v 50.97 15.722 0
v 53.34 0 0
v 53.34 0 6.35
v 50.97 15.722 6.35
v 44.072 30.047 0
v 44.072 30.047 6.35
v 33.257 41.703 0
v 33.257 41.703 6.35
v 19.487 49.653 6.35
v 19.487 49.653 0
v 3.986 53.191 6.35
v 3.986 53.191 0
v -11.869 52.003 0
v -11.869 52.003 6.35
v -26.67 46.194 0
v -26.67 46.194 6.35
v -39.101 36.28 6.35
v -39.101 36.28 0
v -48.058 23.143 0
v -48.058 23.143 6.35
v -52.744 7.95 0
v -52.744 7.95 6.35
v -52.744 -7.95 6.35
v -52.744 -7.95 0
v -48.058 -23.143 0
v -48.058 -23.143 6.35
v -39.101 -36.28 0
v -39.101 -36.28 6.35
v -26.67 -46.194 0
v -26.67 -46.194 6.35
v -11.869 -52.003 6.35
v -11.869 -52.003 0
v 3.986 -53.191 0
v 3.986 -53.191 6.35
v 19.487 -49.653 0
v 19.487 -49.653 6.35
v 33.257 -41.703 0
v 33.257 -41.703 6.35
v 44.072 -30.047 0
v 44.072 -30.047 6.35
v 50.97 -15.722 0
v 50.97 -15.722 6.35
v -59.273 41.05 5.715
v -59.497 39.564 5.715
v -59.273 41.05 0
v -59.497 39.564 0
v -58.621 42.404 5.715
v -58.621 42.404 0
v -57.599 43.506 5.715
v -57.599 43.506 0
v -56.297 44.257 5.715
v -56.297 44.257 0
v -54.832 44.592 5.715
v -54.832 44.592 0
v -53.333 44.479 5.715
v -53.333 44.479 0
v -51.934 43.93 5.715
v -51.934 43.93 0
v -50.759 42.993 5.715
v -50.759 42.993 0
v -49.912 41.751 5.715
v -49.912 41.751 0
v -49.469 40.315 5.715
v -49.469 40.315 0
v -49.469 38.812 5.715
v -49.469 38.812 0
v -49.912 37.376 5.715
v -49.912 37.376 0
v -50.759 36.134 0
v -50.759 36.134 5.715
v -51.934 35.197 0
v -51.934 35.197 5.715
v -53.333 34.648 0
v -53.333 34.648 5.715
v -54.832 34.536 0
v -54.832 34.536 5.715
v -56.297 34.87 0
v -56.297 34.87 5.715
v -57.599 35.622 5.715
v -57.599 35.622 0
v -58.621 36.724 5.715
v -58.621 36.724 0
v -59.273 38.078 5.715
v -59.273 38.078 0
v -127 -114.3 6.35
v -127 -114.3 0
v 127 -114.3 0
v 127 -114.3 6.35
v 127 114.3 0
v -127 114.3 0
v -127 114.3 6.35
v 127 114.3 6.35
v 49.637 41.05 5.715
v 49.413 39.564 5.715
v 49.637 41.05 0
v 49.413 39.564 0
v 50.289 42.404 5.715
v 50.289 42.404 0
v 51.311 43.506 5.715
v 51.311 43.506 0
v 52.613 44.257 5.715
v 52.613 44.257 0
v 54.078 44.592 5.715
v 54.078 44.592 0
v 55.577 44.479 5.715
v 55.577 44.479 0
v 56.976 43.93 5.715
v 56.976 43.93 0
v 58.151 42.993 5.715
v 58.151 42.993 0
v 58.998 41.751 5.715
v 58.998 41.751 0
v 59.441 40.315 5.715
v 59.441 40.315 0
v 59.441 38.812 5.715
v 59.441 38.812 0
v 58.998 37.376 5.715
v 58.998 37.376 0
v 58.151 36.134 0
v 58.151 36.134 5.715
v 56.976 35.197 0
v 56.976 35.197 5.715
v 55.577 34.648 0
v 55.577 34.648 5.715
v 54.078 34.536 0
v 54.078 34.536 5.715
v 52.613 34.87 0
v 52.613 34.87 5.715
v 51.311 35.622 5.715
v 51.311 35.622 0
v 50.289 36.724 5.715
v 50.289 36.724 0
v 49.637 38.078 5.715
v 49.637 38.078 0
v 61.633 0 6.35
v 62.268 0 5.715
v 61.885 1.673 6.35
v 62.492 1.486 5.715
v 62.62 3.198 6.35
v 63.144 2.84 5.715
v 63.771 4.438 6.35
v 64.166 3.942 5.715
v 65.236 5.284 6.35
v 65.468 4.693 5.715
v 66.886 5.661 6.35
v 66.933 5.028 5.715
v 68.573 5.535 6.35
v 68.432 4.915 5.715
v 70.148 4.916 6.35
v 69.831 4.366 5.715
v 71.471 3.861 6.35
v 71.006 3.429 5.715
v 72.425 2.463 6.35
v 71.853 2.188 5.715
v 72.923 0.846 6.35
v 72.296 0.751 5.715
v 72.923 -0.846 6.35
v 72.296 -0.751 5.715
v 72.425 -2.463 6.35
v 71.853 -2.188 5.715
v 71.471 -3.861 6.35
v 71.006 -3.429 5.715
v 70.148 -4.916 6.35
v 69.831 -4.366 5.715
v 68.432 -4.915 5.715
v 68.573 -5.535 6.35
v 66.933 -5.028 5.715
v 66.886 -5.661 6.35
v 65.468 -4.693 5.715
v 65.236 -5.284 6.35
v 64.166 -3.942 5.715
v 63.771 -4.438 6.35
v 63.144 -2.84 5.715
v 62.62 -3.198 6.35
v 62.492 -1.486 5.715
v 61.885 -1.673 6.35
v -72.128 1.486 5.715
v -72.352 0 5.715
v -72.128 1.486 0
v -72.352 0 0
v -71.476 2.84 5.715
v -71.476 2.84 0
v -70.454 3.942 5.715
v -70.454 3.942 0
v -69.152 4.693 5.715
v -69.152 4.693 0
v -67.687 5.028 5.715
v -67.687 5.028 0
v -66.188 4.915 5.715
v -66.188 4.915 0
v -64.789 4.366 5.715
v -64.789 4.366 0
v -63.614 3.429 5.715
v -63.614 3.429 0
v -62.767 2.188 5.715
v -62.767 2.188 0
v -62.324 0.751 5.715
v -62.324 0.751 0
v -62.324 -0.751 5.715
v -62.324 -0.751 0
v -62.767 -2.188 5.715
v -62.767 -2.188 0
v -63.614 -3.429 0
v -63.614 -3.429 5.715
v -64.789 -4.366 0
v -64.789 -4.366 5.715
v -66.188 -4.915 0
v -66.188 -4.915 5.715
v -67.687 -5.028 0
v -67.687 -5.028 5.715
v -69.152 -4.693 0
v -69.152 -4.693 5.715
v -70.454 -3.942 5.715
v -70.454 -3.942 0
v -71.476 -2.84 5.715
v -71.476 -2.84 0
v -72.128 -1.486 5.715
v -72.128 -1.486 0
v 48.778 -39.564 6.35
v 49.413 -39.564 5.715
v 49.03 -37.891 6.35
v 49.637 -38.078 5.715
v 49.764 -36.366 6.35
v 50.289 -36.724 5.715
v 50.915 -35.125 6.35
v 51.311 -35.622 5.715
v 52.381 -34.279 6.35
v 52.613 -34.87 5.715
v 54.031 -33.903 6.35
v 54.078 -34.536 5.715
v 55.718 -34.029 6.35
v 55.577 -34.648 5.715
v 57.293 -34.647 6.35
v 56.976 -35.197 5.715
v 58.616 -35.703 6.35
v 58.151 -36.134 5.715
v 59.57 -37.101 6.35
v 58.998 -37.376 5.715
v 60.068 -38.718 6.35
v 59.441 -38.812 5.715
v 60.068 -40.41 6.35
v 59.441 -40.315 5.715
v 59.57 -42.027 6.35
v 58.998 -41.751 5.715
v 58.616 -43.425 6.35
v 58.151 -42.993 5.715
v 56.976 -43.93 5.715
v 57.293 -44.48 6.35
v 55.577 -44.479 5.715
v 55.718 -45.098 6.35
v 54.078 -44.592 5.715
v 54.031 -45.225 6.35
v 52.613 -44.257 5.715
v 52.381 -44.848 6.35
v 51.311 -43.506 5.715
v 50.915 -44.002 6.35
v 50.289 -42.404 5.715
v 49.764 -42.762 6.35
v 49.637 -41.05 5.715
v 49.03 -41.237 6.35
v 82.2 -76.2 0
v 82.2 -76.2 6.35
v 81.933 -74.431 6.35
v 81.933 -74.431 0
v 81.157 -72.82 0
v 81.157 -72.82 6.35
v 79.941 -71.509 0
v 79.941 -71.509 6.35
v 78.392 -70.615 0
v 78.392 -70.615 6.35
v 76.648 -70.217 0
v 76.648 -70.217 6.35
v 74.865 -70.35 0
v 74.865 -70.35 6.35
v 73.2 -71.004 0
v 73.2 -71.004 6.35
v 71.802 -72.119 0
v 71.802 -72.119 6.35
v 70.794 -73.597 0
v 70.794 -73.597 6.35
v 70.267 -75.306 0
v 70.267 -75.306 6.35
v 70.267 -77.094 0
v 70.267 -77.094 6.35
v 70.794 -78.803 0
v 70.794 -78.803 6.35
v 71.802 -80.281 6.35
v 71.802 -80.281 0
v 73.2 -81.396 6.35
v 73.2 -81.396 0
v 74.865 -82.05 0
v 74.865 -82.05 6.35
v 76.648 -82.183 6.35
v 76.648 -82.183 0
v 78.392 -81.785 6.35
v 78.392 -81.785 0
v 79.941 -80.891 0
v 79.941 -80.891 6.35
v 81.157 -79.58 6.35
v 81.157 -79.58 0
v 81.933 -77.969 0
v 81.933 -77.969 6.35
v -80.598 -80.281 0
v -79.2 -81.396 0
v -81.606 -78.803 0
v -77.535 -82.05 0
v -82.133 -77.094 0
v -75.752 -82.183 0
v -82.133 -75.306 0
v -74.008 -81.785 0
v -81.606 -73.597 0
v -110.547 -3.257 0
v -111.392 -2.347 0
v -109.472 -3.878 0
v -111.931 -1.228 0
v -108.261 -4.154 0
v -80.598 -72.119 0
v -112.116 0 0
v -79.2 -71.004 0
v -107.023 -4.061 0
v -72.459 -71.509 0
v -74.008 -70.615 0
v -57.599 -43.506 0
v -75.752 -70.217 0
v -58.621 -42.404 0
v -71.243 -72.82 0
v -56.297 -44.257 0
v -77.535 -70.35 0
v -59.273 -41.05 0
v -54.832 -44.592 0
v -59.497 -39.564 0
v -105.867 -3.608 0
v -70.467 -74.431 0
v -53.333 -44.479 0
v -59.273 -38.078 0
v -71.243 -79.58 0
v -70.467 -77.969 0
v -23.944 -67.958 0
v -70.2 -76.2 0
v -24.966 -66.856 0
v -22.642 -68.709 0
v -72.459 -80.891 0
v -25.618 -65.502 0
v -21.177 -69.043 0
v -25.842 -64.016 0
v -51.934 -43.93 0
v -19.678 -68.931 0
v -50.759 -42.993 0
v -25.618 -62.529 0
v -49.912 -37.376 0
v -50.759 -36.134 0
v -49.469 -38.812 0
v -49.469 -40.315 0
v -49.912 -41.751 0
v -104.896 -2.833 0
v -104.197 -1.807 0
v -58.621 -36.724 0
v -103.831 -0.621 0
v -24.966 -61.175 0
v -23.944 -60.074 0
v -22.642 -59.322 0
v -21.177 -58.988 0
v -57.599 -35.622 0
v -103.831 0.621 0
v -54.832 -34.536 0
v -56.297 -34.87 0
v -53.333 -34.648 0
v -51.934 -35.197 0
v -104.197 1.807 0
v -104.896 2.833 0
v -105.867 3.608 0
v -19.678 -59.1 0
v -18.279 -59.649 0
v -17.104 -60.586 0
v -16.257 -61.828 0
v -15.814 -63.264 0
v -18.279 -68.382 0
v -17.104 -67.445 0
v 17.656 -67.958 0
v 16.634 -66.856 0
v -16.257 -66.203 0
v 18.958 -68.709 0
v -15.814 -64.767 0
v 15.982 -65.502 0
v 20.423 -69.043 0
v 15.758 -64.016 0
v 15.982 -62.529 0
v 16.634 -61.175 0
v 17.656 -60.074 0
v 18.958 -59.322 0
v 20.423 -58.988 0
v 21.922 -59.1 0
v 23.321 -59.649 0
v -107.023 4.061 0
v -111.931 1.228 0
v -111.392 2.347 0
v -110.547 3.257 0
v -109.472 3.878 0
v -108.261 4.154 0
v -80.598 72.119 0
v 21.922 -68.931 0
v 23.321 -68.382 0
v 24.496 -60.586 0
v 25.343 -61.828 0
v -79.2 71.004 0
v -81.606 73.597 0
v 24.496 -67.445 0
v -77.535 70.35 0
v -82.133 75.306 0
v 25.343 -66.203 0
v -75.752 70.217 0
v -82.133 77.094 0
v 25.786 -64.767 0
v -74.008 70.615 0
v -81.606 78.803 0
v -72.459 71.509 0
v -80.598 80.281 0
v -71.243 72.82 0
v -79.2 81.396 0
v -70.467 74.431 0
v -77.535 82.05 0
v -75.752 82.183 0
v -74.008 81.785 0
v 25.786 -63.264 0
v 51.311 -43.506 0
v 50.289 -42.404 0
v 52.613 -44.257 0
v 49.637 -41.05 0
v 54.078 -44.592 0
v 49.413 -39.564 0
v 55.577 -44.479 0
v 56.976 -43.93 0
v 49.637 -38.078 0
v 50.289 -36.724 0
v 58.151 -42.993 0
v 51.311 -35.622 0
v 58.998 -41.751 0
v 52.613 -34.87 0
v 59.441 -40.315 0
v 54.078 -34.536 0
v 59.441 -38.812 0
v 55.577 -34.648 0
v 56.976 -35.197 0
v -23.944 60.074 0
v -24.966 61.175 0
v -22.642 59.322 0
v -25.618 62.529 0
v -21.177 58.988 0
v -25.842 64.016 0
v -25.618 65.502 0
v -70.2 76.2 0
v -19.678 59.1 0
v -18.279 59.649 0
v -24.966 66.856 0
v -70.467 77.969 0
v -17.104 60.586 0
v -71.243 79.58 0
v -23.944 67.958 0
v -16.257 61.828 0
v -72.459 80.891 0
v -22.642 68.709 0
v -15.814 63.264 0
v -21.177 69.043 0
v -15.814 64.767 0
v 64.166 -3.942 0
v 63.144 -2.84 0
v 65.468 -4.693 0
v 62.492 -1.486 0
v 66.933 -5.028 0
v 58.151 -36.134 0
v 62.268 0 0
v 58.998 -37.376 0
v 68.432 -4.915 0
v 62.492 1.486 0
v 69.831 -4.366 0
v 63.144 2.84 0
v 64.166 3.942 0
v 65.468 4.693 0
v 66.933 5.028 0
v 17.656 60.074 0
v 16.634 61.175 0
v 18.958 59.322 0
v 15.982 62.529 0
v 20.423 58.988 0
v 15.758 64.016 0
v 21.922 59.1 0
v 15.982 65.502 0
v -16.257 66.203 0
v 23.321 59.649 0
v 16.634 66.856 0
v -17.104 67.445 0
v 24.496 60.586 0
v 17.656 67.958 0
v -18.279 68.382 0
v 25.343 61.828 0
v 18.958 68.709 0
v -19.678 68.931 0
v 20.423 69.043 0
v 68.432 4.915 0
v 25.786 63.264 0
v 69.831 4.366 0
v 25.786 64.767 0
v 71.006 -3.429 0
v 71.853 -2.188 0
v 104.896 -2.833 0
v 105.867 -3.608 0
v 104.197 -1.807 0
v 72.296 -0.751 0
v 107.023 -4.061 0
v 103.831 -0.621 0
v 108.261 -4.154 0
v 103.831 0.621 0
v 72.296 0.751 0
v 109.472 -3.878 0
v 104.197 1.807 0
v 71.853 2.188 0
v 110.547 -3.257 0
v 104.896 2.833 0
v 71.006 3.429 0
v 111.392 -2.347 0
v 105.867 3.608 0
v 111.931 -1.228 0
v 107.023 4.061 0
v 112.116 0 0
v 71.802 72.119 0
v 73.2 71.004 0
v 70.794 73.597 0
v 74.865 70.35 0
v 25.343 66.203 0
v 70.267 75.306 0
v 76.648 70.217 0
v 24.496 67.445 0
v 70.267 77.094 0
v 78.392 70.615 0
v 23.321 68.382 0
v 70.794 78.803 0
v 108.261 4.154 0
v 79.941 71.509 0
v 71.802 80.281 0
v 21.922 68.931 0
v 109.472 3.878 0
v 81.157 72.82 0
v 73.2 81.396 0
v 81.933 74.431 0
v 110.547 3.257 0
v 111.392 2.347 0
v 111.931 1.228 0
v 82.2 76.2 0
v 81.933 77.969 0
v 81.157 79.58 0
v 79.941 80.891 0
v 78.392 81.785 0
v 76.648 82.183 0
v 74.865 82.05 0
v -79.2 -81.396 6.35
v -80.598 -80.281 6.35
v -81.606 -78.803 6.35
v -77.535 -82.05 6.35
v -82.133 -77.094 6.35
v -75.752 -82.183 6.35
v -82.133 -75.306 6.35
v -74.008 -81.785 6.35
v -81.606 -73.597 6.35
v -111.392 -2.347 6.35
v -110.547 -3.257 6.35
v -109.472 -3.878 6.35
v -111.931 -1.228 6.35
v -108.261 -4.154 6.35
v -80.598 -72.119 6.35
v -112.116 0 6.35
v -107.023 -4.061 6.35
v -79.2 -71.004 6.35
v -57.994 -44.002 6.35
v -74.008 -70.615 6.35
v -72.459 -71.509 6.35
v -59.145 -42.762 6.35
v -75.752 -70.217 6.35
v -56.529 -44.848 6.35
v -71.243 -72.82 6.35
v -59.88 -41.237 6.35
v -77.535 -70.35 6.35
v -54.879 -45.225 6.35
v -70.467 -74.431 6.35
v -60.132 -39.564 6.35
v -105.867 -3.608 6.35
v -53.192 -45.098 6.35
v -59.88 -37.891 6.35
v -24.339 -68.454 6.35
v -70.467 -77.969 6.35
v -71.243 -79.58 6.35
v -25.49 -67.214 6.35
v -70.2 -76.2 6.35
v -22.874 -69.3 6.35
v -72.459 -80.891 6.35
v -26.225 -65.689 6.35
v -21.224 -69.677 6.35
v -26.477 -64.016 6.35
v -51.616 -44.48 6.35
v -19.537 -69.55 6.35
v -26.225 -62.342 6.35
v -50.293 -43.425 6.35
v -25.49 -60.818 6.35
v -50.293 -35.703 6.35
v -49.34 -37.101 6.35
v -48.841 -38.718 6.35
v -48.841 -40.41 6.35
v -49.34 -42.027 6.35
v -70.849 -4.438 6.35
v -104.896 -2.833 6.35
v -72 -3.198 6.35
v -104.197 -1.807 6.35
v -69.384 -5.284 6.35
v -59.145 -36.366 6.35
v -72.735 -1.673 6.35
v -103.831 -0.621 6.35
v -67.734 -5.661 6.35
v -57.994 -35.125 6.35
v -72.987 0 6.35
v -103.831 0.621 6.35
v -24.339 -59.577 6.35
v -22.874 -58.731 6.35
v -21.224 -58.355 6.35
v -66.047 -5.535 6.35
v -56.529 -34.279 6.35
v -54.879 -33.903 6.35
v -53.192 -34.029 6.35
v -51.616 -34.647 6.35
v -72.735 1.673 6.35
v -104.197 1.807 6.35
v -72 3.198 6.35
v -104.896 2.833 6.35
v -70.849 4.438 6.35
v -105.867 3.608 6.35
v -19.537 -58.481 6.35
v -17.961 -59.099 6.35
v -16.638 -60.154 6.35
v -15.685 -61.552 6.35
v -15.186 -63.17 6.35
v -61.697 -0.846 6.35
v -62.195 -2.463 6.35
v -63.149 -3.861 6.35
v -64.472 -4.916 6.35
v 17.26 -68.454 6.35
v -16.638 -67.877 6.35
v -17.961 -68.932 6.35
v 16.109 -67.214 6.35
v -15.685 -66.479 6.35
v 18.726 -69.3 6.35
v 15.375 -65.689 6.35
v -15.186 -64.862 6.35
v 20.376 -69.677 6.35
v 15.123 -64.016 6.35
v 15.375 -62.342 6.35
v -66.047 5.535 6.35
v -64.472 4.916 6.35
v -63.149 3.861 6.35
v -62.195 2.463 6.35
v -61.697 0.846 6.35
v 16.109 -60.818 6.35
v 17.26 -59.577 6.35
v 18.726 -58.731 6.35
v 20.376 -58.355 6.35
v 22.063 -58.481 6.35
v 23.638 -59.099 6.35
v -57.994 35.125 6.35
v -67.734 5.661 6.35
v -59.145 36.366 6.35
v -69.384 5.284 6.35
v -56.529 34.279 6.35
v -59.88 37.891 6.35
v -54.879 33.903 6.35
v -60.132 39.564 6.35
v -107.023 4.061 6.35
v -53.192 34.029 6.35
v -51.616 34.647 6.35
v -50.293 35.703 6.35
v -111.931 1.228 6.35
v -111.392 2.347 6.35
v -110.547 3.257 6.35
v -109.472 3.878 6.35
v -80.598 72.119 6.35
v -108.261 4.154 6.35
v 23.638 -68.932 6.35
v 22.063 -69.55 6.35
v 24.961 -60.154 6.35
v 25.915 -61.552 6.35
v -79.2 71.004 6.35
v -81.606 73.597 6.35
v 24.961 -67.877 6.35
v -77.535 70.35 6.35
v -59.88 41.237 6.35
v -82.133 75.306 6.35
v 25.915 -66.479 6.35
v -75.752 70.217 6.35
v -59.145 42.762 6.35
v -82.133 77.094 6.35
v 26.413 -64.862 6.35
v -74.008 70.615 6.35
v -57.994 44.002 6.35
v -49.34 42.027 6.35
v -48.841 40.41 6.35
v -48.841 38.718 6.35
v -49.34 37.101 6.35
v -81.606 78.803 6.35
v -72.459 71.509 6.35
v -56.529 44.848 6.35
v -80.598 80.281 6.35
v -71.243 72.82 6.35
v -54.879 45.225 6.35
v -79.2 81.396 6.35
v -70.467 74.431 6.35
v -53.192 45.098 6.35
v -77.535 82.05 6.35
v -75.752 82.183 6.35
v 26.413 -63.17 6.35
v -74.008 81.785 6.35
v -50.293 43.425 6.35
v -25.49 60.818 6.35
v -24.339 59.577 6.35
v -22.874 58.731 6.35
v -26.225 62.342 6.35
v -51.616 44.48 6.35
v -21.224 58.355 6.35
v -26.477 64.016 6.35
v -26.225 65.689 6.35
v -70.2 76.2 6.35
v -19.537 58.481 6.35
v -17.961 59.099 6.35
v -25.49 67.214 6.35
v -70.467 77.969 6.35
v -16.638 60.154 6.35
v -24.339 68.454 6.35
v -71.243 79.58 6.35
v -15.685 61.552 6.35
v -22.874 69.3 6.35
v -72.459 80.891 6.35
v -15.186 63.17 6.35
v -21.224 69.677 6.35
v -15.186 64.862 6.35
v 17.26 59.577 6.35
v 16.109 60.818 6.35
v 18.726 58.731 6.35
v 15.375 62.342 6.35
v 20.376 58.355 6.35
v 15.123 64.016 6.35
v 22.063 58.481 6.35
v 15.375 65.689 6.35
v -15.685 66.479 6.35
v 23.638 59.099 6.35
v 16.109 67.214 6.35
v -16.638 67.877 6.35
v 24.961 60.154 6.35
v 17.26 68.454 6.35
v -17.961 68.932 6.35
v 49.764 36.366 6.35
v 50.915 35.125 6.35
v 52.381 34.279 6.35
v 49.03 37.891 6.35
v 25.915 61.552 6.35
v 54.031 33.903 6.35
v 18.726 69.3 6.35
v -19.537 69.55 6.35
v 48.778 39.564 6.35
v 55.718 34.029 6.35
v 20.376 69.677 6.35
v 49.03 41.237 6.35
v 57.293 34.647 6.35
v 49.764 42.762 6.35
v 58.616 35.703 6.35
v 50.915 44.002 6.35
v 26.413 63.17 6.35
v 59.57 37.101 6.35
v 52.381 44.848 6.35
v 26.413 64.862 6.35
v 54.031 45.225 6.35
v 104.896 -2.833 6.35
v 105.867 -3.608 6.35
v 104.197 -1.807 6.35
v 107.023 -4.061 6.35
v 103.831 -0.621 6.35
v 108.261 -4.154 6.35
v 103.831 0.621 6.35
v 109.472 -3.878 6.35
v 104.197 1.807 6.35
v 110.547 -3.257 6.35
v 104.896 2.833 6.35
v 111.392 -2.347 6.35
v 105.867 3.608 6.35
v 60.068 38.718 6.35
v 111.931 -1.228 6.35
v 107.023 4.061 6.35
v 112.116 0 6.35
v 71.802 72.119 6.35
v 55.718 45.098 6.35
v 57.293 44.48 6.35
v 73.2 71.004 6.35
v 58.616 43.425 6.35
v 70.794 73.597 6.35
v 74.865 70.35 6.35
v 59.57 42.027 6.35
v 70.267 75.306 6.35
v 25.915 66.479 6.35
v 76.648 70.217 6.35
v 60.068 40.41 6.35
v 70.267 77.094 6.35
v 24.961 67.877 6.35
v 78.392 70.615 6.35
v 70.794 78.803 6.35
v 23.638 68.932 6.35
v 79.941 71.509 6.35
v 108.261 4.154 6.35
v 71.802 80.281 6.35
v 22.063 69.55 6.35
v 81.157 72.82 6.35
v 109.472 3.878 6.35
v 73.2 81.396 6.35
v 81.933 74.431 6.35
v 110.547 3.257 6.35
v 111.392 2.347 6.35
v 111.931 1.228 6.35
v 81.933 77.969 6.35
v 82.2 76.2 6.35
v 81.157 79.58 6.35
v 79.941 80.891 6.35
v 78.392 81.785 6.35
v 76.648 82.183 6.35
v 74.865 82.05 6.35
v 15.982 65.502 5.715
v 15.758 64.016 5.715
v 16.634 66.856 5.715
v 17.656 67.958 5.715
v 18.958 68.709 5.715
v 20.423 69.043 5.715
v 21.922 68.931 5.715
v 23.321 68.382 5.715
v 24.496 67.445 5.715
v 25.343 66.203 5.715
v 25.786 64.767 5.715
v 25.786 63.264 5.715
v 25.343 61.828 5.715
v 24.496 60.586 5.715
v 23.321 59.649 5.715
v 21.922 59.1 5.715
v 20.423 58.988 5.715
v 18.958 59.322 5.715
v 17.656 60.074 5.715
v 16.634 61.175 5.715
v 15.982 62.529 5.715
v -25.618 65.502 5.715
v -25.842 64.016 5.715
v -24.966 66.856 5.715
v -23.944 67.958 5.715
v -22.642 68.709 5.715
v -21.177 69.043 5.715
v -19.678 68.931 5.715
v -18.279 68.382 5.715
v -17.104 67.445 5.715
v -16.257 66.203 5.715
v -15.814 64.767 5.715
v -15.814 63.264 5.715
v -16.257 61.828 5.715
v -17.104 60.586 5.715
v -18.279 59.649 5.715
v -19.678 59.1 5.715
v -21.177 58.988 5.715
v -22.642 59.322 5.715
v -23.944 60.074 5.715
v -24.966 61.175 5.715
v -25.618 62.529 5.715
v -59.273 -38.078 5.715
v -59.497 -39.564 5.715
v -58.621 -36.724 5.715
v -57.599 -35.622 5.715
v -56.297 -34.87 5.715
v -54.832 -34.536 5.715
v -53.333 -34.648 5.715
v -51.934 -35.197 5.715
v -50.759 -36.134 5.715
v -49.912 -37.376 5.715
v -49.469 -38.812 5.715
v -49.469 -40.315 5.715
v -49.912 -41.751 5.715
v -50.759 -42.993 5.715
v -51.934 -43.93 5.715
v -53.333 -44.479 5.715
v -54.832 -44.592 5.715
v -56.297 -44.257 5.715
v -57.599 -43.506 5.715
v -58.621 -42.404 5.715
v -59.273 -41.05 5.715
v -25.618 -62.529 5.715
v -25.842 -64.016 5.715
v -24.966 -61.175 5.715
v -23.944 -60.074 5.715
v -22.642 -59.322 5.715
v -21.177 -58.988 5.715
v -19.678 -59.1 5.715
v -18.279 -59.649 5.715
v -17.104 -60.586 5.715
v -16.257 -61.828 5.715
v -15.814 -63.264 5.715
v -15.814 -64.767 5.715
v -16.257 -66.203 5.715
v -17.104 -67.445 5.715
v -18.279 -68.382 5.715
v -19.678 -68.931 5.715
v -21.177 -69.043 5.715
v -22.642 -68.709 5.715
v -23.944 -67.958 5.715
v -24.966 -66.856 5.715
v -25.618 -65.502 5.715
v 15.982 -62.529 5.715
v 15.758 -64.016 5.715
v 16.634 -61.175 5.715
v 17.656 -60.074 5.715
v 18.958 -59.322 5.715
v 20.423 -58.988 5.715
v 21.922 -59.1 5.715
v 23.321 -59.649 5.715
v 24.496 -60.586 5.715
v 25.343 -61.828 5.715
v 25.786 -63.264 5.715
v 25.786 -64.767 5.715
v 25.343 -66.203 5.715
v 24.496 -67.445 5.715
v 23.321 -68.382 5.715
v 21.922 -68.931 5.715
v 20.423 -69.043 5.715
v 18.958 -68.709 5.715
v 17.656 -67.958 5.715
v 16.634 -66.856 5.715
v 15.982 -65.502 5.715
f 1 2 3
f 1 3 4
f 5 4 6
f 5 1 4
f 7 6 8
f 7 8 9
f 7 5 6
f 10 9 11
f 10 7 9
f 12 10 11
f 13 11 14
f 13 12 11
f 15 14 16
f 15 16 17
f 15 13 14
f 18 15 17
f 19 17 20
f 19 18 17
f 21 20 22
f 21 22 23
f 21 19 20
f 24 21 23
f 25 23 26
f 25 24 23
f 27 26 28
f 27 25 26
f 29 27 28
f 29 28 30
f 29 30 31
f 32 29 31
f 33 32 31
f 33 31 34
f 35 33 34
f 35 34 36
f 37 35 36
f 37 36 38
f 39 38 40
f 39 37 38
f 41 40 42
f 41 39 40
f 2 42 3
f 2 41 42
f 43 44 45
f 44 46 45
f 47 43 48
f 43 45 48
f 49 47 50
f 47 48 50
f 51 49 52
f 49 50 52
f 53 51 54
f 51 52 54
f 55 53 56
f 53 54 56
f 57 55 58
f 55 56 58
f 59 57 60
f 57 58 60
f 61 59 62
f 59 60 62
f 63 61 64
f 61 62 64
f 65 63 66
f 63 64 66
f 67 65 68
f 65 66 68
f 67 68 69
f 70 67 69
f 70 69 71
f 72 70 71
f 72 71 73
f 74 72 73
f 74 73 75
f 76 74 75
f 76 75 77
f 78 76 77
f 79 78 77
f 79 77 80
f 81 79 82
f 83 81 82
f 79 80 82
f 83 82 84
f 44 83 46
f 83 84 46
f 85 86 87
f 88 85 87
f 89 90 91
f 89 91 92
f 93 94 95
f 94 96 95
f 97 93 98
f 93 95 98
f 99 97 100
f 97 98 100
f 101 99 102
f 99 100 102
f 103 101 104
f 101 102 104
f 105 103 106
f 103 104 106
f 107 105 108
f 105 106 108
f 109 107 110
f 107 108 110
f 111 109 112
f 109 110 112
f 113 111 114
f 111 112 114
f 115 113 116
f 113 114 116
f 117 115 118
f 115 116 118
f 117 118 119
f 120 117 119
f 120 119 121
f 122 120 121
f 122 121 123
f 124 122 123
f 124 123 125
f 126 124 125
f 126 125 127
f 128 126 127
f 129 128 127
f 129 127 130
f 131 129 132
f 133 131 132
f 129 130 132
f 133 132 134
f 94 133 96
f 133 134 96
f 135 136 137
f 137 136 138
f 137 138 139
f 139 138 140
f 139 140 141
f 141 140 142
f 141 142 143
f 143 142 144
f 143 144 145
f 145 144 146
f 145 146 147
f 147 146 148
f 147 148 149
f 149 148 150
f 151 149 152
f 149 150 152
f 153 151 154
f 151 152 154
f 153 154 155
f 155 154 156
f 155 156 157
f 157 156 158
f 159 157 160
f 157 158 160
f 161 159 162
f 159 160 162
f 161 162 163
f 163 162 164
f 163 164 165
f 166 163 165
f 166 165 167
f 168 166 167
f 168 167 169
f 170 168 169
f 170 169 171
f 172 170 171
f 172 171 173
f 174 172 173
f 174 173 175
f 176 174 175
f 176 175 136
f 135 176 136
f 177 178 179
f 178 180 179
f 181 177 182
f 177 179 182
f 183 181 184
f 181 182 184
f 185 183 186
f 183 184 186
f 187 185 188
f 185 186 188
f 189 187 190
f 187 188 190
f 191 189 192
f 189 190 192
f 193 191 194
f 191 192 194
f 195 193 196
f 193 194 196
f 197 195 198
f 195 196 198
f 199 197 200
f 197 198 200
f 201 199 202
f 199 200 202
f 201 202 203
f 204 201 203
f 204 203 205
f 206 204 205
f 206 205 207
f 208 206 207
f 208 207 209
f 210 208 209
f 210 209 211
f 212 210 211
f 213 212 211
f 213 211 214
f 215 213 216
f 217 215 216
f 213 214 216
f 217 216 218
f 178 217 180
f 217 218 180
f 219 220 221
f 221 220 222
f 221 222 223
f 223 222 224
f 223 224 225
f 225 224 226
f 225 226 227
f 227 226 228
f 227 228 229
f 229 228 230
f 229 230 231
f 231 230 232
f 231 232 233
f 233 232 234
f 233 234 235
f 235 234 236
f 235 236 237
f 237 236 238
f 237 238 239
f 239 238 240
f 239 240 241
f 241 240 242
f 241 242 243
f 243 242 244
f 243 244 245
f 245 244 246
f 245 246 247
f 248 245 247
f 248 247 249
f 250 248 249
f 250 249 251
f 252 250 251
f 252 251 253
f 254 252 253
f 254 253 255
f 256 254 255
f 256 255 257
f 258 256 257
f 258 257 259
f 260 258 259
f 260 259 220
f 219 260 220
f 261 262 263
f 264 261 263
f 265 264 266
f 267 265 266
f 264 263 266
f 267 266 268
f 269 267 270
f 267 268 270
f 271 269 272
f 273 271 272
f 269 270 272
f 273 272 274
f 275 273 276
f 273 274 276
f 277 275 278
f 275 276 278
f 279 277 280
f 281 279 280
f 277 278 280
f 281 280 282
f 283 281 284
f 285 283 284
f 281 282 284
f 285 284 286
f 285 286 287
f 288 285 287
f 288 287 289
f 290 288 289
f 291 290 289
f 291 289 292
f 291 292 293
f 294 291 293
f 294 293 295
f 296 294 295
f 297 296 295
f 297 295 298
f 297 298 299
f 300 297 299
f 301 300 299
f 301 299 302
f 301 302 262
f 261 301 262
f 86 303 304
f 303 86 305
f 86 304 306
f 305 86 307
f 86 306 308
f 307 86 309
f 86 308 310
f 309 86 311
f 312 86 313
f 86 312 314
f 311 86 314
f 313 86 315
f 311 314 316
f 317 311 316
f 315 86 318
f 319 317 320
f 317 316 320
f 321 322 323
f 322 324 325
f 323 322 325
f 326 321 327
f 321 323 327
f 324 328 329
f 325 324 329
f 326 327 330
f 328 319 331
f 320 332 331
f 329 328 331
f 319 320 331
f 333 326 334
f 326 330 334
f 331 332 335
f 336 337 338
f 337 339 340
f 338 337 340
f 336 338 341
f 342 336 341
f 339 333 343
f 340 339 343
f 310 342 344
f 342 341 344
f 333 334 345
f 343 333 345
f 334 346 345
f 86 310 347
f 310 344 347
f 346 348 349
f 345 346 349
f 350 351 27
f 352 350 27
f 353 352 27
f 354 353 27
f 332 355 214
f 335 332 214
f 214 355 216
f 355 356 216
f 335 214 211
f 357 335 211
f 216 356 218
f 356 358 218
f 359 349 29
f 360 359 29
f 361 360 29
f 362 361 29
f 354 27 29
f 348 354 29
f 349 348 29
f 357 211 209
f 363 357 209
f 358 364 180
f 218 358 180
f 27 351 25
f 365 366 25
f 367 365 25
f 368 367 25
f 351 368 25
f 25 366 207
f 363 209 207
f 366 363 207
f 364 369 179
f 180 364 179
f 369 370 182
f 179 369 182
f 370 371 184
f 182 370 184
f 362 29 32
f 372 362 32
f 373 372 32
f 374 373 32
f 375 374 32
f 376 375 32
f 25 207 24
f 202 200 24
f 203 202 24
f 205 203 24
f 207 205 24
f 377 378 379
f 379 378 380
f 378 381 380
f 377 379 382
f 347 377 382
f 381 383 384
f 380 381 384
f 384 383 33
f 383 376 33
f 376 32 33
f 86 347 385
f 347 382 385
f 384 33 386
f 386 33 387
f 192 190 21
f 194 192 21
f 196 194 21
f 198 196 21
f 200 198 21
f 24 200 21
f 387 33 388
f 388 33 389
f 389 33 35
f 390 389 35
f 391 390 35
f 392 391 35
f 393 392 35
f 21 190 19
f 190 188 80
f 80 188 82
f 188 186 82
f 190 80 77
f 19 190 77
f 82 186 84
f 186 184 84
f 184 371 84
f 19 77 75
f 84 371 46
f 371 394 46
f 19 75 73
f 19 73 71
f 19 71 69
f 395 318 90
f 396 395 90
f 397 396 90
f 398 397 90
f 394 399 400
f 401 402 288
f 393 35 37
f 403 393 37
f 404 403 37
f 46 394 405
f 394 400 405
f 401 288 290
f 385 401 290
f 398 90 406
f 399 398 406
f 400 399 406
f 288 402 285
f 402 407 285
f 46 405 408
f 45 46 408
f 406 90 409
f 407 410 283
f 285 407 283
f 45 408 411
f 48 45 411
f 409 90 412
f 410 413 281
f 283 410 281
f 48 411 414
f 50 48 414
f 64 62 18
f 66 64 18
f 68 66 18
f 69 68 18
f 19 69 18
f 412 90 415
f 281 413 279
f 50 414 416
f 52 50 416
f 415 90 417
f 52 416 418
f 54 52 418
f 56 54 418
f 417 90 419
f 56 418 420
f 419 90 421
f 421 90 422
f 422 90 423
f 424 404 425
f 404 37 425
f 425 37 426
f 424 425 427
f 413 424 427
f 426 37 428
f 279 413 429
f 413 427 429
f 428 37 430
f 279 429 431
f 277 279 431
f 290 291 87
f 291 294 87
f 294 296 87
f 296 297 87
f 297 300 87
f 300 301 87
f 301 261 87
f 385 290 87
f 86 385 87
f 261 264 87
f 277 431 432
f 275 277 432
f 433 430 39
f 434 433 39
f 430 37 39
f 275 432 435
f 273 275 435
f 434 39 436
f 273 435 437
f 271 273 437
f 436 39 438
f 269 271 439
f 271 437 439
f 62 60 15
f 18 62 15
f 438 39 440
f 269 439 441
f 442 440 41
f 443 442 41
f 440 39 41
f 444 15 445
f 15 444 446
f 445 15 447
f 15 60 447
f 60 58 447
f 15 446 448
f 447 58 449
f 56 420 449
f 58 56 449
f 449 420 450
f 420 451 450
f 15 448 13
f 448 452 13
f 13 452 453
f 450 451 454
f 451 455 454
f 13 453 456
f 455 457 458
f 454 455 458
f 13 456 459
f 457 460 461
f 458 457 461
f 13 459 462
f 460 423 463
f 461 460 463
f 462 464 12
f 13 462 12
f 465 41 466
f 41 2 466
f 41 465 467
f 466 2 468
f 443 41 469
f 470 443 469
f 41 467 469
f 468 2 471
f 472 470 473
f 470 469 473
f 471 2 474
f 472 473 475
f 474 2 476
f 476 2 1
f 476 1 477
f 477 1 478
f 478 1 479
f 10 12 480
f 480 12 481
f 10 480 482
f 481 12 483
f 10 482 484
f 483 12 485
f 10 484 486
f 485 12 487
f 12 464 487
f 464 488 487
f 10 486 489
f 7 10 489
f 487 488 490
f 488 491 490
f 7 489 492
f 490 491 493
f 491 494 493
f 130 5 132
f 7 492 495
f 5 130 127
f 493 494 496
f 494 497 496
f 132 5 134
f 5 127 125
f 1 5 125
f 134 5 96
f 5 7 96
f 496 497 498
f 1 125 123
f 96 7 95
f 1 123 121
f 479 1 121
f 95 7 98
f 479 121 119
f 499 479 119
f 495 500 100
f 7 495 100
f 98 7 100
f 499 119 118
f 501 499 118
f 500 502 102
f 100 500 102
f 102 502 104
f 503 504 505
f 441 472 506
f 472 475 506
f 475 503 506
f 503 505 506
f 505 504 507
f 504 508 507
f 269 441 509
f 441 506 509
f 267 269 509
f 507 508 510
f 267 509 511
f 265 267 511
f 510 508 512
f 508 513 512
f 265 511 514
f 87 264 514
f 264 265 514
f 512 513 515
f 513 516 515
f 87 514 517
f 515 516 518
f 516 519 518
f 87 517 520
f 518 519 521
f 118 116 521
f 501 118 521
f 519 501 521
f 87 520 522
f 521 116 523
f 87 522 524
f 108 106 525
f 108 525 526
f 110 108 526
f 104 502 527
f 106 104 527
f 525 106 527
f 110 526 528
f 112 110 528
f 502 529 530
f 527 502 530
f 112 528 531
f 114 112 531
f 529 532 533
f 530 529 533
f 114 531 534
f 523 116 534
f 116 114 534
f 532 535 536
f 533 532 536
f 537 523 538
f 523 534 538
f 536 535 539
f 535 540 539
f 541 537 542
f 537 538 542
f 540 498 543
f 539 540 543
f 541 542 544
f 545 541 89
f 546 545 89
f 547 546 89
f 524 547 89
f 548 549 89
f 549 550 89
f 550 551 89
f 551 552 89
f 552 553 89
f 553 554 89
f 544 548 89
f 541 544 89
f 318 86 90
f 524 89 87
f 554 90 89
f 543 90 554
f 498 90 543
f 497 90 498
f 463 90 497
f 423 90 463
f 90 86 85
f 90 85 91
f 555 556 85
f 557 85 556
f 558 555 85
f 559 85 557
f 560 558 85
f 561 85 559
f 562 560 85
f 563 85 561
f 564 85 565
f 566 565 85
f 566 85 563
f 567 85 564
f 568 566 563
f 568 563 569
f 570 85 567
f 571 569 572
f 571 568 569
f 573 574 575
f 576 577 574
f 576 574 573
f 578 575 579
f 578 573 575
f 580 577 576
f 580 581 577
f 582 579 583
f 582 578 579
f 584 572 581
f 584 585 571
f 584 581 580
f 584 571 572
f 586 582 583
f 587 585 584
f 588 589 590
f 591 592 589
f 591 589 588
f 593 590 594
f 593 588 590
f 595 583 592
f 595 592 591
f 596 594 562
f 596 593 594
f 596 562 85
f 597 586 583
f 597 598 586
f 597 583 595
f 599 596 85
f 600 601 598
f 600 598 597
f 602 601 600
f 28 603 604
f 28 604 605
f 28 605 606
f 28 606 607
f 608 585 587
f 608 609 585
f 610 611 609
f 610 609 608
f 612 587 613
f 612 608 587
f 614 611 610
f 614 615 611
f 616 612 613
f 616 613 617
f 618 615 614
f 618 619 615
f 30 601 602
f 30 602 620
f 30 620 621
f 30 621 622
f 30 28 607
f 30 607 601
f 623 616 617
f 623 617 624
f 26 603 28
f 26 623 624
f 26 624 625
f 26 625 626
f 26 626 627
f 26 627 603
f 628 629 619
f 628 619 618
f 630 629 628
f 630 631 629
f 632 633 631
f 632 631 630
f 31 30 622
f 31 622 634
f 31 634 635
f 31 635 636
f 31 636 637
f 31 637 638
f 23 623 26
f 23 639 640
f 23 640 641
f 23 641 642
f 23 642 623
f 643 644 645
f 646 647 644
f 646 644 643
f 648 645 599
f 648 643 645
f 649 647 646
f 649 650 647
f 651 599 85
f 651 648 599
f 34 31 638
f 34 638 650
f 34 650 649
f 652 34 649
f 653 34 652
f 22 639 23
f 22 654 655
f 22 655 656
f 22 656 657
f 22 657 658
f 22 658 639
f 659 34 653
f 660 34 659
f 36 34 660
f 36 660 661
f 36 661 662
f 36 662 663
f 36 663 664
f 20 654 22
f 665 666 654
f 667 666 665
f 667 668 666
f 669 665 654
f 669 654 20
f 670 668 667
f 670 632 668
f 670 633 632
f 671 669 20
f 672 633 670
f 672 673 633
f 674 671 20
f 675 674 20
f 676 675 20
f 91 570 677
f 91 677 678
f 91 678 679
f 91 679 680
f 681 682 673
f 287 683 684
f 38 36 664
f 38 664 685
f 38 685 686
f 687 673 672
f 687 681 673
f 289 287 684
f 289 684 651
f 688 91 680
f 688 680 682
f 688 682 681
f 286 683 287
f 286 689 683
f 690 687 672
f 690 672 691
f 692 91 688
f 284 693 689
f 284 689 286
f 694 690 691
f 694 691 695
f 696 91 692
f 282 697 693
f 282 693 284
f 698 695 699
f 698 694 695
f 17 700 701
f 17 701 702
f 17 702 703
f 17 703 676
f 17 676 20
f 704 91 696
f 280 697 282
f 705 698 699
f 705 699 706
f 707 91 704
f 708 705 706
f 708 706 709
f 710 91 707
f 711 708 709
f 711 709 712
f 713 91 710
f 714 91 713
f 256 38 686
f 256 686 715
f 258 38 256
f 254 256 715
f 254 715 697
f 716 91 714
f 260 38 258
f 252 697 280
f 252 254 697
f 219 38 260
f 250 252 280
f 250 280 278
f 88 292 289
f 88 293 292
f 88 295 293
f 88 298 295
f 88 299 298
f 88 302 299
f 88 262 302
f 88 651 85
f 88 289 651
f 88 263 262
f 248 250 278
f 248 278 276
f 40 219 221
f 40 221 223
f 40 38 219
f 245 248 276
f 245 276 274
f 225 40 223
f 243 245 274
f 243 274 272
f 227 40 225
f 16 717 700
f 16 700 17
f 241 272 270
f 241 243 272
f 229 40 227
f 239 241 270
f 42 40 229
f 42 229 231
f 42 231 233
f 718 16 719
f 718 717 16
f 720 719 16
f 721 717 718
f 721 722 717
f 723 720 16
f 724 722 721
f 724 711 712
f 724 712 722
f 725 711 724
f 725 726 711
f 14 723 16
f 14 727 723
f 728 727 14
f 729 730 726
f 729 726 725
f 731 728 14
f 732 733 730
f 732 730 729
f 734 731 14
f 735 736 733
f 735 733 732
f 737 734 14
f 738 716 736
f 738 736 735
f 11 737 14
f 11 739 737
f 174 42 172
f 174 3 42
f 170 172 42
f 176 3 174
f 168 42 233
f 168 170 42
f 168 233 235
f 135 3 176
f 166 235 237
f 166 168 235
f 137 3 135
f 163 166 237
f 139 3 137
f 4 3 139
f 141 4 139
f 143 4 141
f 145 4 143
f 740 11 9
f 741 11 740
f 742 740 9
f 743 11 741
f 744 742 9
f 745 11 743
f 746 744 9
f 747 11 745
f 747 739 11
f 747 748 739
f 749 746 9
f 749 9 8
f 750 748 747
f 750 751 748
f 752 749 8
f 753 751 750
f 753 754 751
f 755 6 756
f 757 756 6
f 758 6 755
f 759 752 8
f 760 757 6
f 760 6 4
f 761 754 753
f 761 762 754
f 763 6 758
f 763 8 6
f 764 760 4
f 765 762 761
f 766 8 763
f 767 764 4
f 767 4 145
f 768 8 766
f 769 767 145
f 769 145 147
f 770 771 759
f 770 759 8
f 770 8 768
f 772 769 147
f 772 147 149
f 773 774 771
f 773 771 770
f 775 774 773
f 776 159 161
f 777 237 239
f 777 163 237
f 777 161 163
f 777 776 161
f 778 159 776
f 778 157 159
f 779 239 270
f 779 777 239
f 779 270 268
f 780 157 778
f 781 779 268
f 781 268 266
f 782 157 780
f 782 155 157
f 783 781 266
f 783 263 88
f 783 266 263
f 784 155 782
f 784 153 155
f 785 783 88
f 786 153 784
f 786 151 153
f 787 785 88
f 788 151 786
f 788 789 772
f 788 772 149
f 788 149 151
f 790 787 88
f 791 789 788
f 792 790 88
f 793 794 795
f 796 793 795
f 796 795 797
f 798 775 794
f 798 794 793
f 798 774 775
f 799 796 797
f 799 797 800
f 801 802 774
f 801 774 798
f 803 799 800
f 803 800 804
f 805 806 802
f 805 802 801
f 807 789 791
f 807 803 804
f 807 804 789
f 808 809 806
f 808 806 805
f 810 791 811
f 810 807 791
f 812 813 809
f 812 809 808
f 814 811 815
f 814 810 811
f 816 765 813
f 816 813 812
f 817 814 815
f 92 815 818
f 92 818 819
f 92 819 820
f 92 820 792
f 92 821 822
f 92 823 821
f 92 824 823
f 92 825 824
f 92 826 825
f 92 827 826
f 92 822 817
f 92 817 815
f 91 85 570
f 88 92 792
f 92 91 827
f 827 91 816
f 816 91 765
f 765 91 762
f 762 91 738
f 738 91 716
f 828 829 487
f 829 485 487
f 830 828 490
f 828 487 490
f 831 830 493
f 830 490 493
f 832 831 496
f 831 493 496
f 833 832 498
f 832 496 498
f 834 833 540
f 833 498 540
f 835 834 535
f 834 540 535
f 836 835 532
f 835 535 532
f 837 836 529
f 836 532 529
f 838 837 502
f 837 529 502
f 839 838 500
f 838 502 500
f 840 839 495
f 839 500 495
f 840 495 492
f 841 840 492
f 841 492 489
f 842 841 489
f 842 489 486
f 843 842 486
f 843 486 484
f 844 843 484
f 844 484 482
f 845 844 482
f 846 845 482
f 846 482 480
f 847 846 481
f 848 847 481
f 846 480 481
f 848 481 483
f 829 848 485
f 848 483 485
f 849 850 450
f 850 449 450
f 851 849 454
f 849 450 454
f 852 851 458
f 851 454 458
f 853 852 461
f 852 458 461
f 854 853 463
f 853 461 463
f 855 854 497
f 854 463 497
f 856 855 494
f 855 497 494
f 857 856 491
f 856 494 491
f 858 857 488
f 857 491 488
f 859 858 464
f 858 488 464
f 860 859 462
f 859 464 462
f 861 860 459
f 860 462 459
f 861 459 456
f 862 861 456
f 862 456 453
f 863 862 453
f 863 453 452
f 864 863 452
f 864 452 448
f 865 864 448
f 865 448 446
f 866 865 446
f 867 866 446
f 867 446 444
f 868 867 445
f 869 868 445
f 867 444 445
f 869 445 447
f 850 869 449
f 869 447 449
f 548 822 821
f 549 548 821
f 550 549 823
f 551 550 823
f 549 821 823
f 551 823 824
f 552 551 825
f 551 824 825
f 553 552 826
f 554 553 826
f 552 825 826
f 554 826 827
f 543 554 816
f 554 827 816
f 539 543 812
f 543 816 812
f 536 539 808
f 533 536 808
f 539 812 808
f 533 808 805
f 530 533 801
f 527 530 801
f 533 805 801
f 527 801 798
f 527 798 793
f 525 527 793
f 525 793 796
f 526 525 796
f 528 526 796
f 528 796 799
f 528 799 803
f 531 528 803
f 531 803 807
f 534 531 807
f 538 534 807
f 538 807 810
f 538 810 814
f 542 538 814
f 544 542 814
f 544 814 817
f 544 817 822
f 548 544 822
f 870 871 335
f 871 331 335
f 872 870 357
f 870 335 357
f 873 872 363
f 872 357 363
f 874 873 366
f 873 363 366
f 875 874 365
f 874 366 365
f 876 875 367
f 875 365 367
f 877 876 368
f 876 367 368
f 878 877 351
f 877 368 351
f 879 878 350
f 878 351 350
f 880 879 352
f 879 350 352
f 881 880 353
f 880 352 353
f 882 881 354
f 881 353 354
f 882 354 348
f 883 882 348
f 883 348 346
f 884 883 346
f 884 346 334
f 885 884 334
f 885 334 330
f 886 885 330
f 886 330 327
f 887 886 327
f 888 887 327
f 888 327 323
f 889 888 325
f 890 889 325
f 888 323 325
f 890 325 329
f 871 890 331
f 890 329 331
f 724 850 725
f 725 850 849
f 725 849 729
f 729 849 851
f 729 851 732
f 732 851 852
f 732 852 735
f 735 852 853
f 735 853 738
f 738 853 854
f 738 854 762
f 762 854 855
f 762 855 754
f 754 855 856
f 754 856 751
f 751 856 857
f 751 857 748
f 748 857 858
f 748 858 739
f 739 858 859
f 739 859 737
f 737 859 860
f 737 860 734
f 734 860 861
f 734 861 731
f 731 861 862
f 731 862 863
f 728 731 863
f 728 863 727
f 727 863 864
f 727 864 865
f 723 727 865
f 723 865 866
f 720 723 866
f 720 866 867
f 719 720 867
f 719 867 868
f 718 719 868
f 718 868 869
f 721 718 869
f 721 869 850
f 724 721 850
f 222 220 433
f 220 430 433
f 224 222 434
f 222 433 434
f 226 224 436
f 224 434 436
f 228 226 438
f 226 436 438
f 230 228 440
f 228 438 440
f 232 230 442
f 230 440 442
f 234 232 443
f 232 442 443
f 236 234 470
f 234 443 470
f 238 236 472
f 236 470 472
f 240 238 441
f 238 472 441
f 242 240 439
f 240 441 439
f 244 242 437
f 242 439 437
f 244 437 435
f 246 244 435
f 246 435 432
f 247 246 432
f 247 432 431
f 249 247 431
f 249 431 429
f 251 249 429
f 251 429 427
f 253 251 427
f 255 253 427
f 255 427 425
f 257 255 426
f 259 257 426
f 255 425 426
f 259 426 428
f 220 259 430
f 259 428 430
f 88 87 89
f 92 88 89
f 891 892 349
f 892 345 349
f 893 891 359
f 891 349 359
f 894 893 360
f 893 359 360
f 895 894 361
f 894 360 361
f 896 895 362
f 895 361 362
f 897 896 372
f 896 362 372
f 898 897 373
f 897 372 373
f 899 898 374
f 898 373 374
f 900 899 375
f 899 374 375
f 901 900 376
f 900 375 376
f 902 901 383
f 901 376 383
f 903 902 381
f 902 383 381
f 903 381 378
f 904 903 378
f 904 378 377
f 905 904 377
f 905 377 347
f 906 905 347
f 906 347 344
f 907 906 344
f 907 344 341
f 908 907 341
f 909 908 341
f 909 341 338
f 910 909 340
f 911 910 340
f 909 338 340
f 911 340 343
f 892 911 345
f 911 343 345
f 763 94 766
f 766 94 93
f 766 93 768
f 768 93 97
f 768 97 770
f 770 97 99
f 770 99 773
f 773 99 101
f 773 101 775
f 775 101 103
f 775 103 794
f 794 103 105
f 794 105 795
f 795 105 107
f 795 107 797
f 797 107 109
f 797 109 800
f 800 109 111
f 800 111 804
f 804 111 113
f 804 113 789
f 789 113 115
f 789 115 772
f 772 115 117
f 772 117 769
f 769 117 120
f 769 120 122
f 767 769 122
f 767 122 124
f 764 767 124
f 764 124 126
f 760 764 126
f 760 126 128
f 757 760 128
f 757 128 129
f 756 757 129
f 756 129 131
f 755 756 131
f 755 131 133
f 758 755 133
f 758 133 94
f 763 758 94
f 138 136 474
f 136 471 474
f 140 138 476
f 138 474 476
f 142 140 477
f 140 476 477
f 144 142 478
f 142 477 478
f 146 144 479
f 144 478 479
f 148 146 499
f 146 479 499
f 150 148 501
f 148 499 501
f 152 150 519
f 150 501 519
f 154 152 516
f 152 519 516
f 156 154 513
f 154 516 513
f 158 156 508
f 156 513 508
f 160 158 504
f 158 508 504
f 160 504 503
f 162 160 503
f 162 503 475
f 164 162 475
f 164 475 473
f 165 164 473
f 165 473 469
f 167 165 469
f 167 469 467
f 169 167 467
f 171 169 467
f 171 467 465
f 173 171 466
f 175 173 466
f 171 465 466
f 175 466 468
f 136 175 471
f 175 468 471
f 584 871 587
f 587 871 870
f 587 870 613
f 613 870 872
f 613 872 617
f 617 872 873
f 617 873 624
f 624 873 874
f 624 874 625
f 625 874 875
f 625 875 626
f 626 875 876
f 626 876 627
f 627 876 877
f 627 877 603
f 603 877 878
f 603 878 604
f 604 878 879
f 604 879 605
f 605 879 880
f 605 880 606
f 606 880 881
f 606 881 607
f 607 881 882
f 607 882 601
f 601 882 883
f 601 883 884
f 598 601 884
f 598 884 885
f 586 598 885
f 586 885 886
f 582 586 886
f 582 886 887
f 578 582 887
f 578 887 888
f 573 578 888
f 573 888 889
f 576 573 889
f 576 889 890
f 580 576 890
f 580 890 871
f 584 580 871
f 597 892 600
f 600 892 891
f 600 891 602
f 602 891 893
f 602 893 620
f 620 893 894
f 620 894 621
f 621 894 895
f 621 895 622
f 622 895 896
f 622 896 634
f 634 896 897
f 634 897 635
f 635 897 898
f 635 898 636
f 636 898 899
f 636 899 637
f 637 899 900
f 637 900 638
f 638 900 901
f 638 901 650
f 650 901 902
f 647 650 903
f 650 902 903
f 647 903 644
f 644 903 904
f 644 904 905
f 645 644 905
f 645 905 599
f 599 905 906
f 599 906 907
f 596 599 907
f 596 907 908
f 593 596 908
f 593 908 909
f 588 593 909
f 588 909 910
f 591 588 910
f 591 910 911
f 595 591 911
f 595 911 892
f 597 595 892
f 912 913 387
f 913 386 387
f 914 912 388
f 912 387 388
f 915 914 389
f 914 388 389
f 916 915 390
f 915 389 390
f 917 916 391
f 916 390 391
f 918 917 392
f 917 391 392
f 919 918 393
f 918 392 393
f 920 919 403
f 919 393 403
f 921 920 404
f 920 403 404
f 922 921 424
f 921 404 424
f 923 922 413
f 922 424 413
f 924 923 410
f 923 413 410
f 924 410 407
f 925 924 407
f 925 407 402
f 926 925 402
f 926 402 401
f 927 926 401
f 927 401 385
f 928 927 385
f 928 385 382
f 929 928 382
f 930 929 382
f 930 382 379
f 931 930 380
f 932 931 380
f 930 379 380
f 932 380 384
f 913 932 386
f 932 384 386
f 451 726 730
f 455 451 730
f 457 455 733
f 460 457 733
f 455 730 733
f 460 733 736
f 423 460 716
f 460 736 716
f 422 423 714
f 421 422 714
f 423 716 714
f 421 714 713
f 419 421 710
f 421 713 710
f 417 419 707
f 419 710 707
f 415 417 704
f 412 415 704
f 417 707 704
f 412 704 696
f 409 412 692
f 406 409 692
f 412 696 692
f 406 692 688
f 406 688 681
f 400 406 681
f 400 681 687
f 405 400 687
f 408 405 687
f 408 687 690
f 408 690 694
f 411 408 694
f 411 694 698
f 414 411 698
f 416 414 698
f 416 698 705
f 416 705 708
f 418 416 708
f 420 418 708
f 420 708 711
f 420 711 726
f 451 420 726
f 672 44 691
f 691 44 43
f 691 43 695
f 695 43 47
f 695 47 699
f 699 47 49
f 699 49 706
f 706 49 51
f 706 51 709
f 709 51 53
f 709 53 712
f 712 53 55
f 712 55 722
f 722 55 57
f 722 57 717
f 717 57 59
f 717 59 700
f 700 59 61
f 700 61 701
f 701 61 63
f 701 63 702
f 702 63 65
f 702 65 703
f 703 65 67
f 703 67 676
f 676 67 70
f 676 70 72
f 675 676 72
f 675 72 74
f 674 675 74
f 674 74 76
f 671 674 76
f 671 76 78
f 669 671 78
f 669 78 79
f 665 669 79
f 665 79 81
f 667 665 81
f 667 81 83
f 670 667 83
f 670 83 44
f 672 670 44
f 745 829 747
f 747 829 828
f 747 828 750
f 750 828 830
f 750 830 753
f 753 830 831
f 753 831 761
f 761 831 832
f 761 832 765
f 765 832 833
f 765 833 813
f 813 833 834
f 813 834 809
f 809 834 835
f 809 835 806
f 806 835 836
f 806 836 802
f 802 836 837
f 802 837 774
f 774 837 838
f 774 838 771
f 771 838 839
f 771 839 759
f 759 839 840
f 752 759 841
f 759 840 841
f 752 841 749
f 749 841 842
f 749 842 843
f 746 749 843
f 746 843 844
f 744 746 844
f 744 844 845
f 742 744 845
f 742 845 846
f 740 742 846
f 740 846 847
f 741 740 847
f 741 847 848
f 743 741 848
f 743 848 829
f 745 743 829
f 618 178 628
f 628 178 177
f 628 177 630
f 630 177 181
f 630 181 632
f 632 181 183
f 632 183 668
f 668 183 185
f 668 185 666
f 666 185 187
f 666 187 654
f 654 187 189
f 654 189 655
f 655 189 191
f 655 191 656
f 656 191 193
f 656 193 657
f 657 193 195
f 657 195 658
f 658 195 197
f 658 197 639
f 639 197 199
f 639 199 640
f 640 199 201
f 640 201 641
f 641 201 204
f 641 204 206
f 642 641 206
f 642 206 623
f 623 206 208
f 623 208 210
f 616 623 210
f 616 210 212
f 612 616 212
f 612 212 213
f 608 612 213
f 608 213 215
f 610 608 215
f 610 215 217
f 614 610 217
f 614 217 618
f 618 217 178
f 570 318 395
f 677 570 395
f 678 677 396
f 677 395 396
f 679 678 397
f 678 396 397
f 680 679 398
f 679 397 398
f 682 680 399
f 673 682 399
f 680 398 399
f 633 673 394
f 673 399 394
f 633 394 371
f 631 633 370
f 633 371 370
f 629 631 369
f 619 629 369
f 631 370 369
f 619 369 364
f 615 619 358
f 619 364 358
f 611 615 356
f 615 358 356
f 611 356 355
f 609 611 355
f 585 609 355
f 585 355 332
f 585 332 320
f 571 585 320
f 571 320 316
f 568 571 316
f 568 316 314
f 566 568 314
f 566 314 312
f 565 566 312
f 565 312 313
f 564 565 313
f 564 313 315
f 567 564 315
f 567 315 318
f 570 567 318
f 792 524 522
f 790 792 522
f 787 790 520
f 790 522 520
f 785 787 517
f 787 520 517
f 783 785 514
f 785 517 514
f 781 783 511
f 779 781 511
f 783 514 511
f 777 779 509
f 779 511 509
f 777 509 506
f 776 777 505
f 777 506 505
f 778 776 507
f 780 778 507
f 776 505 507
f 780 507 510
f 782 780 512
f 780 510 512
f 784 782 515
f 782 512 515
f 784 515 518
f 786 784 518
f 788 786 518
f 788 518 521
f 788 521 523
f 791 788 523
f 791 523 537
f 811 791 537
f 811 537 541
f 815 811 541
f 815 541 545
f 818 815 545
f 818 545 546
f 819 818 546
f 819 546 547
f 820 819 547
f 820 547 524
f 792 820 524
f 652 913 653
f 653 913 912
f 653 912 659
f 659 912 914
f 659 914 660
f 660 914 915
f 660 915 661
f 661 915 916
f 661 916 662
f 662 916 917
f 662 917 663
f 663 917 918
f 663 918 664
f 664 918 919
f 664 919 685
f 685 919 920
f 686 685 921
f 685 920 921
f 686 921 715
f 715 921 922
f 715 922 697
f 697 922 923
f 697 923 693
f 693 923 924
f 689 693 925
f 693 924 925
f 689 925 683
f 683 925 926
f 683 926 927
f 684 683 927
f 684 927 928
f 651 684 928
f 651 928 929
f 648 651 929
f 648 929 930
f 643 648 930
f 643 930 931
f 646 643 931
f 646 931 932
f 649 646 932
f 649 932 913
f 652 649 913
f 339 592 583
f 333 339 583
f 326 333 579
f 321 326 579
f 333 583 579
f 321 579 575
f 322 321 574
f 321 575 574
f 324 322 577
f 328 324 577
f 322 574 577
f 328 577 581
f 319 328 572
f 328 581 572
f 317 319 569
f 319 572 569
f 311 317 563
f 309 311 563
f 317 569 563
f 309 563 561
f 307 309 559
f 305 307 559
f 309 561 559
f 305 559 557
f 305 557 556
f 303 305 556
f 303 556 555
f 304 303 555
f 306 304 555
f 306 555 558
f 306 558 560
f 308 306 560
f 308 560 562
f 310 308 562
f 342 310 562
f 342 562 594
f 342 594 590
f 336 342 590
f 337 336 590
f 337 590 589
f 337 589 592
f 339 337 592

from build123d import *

# Parameters (mm, degrees)
SKETCH1_W                         = 254
SKETCH1_H                         = 228.6
SKETCH1_R                         = 53.34
BOSS_EXTRUDE1_DEPTH               = 6.35
F_3_8_CLEARANCE_HOLE1_D           = 10.0838
F_3_8_CLEARANCE_HOLE1_CSINK_D     = 11.3538
F_3_8_CLEARANCE_HOLE1_CSINK_ANGLE = 90
F_12_0_12_DIAMETER_HOLE1_D        = 12
SKETCH11_R                        = 4.1656
CUT_EXTRUDE1_DEPTH                = 171.978982627


with BuildPart() as part:
    # Sketch1 → Boss-Extrude1 (new body)
    with BuildSketch(Plane.XY):
        Rectangle(SKETCH1_W, SKETCH1_H)
        Circle(SKETCH1_R, mode=Mode.SUBTRACT)
    extrude(amount=BOSS_EXTRUDE1_DEPTH)

    # 3/8 Clearance Hole1 (through all)
    with Locations(Plane.XY.offset(6.35)):
        with Locations((-54.454933891, -39.563825332), (-67.31, 0), (-54.454933891, 39.563825332), (-20.799933891, 64.015614112), (20.799933891, 64.015614112), (54.454933891, 39.563825332), (67.31, 0), (54.454933891, -39.563825332), (20.799933891, -64.015614112), (-20.799933891, -64.015614112)):
            CounterSinkHole(F_3_8_CLEARANCE_HOLE1_D / 2, F_3_8_CLEARANCE_HOLE1_CSINK_D / 2, counter_sink_angle=F_3_8_CLEARANCE_HOLE1_CSINK_ANGLE)

    # Ø12.0 (12) Diameter Hole1 (through all)
    with Locations(Plane(origin=(0, 0, 0), x_dir=(-1, 0, 0), z_dir=(0, 0, -1))):
        with Locations((76.2, 76.2), (76.2, -76.2), (-76.2, -76.2), (-76.2, 76.2)):
            Hole(F_12_0_12_DIAMETER_HOLE1_D / 2)

    # Sketch11 → Cut-Extrude1 (cut, through all)
    with BuildSketch(Plane(origin=(0, 0, 0), x_dir=(-1, 0, 0), z_dir=(0, 0, -1))):
        with Locations((107.95, 0)):
            Circle(SKETCH11_R)
        with Locations(Location((-107.95, 0, 0), (0, 0, 180))):
            Circle(SKETCH11_R)
    extrude(amount=-CUT_EXTRUDE1_DEPTH, mode=Mode.SUBTRACT)


solid = part.part
